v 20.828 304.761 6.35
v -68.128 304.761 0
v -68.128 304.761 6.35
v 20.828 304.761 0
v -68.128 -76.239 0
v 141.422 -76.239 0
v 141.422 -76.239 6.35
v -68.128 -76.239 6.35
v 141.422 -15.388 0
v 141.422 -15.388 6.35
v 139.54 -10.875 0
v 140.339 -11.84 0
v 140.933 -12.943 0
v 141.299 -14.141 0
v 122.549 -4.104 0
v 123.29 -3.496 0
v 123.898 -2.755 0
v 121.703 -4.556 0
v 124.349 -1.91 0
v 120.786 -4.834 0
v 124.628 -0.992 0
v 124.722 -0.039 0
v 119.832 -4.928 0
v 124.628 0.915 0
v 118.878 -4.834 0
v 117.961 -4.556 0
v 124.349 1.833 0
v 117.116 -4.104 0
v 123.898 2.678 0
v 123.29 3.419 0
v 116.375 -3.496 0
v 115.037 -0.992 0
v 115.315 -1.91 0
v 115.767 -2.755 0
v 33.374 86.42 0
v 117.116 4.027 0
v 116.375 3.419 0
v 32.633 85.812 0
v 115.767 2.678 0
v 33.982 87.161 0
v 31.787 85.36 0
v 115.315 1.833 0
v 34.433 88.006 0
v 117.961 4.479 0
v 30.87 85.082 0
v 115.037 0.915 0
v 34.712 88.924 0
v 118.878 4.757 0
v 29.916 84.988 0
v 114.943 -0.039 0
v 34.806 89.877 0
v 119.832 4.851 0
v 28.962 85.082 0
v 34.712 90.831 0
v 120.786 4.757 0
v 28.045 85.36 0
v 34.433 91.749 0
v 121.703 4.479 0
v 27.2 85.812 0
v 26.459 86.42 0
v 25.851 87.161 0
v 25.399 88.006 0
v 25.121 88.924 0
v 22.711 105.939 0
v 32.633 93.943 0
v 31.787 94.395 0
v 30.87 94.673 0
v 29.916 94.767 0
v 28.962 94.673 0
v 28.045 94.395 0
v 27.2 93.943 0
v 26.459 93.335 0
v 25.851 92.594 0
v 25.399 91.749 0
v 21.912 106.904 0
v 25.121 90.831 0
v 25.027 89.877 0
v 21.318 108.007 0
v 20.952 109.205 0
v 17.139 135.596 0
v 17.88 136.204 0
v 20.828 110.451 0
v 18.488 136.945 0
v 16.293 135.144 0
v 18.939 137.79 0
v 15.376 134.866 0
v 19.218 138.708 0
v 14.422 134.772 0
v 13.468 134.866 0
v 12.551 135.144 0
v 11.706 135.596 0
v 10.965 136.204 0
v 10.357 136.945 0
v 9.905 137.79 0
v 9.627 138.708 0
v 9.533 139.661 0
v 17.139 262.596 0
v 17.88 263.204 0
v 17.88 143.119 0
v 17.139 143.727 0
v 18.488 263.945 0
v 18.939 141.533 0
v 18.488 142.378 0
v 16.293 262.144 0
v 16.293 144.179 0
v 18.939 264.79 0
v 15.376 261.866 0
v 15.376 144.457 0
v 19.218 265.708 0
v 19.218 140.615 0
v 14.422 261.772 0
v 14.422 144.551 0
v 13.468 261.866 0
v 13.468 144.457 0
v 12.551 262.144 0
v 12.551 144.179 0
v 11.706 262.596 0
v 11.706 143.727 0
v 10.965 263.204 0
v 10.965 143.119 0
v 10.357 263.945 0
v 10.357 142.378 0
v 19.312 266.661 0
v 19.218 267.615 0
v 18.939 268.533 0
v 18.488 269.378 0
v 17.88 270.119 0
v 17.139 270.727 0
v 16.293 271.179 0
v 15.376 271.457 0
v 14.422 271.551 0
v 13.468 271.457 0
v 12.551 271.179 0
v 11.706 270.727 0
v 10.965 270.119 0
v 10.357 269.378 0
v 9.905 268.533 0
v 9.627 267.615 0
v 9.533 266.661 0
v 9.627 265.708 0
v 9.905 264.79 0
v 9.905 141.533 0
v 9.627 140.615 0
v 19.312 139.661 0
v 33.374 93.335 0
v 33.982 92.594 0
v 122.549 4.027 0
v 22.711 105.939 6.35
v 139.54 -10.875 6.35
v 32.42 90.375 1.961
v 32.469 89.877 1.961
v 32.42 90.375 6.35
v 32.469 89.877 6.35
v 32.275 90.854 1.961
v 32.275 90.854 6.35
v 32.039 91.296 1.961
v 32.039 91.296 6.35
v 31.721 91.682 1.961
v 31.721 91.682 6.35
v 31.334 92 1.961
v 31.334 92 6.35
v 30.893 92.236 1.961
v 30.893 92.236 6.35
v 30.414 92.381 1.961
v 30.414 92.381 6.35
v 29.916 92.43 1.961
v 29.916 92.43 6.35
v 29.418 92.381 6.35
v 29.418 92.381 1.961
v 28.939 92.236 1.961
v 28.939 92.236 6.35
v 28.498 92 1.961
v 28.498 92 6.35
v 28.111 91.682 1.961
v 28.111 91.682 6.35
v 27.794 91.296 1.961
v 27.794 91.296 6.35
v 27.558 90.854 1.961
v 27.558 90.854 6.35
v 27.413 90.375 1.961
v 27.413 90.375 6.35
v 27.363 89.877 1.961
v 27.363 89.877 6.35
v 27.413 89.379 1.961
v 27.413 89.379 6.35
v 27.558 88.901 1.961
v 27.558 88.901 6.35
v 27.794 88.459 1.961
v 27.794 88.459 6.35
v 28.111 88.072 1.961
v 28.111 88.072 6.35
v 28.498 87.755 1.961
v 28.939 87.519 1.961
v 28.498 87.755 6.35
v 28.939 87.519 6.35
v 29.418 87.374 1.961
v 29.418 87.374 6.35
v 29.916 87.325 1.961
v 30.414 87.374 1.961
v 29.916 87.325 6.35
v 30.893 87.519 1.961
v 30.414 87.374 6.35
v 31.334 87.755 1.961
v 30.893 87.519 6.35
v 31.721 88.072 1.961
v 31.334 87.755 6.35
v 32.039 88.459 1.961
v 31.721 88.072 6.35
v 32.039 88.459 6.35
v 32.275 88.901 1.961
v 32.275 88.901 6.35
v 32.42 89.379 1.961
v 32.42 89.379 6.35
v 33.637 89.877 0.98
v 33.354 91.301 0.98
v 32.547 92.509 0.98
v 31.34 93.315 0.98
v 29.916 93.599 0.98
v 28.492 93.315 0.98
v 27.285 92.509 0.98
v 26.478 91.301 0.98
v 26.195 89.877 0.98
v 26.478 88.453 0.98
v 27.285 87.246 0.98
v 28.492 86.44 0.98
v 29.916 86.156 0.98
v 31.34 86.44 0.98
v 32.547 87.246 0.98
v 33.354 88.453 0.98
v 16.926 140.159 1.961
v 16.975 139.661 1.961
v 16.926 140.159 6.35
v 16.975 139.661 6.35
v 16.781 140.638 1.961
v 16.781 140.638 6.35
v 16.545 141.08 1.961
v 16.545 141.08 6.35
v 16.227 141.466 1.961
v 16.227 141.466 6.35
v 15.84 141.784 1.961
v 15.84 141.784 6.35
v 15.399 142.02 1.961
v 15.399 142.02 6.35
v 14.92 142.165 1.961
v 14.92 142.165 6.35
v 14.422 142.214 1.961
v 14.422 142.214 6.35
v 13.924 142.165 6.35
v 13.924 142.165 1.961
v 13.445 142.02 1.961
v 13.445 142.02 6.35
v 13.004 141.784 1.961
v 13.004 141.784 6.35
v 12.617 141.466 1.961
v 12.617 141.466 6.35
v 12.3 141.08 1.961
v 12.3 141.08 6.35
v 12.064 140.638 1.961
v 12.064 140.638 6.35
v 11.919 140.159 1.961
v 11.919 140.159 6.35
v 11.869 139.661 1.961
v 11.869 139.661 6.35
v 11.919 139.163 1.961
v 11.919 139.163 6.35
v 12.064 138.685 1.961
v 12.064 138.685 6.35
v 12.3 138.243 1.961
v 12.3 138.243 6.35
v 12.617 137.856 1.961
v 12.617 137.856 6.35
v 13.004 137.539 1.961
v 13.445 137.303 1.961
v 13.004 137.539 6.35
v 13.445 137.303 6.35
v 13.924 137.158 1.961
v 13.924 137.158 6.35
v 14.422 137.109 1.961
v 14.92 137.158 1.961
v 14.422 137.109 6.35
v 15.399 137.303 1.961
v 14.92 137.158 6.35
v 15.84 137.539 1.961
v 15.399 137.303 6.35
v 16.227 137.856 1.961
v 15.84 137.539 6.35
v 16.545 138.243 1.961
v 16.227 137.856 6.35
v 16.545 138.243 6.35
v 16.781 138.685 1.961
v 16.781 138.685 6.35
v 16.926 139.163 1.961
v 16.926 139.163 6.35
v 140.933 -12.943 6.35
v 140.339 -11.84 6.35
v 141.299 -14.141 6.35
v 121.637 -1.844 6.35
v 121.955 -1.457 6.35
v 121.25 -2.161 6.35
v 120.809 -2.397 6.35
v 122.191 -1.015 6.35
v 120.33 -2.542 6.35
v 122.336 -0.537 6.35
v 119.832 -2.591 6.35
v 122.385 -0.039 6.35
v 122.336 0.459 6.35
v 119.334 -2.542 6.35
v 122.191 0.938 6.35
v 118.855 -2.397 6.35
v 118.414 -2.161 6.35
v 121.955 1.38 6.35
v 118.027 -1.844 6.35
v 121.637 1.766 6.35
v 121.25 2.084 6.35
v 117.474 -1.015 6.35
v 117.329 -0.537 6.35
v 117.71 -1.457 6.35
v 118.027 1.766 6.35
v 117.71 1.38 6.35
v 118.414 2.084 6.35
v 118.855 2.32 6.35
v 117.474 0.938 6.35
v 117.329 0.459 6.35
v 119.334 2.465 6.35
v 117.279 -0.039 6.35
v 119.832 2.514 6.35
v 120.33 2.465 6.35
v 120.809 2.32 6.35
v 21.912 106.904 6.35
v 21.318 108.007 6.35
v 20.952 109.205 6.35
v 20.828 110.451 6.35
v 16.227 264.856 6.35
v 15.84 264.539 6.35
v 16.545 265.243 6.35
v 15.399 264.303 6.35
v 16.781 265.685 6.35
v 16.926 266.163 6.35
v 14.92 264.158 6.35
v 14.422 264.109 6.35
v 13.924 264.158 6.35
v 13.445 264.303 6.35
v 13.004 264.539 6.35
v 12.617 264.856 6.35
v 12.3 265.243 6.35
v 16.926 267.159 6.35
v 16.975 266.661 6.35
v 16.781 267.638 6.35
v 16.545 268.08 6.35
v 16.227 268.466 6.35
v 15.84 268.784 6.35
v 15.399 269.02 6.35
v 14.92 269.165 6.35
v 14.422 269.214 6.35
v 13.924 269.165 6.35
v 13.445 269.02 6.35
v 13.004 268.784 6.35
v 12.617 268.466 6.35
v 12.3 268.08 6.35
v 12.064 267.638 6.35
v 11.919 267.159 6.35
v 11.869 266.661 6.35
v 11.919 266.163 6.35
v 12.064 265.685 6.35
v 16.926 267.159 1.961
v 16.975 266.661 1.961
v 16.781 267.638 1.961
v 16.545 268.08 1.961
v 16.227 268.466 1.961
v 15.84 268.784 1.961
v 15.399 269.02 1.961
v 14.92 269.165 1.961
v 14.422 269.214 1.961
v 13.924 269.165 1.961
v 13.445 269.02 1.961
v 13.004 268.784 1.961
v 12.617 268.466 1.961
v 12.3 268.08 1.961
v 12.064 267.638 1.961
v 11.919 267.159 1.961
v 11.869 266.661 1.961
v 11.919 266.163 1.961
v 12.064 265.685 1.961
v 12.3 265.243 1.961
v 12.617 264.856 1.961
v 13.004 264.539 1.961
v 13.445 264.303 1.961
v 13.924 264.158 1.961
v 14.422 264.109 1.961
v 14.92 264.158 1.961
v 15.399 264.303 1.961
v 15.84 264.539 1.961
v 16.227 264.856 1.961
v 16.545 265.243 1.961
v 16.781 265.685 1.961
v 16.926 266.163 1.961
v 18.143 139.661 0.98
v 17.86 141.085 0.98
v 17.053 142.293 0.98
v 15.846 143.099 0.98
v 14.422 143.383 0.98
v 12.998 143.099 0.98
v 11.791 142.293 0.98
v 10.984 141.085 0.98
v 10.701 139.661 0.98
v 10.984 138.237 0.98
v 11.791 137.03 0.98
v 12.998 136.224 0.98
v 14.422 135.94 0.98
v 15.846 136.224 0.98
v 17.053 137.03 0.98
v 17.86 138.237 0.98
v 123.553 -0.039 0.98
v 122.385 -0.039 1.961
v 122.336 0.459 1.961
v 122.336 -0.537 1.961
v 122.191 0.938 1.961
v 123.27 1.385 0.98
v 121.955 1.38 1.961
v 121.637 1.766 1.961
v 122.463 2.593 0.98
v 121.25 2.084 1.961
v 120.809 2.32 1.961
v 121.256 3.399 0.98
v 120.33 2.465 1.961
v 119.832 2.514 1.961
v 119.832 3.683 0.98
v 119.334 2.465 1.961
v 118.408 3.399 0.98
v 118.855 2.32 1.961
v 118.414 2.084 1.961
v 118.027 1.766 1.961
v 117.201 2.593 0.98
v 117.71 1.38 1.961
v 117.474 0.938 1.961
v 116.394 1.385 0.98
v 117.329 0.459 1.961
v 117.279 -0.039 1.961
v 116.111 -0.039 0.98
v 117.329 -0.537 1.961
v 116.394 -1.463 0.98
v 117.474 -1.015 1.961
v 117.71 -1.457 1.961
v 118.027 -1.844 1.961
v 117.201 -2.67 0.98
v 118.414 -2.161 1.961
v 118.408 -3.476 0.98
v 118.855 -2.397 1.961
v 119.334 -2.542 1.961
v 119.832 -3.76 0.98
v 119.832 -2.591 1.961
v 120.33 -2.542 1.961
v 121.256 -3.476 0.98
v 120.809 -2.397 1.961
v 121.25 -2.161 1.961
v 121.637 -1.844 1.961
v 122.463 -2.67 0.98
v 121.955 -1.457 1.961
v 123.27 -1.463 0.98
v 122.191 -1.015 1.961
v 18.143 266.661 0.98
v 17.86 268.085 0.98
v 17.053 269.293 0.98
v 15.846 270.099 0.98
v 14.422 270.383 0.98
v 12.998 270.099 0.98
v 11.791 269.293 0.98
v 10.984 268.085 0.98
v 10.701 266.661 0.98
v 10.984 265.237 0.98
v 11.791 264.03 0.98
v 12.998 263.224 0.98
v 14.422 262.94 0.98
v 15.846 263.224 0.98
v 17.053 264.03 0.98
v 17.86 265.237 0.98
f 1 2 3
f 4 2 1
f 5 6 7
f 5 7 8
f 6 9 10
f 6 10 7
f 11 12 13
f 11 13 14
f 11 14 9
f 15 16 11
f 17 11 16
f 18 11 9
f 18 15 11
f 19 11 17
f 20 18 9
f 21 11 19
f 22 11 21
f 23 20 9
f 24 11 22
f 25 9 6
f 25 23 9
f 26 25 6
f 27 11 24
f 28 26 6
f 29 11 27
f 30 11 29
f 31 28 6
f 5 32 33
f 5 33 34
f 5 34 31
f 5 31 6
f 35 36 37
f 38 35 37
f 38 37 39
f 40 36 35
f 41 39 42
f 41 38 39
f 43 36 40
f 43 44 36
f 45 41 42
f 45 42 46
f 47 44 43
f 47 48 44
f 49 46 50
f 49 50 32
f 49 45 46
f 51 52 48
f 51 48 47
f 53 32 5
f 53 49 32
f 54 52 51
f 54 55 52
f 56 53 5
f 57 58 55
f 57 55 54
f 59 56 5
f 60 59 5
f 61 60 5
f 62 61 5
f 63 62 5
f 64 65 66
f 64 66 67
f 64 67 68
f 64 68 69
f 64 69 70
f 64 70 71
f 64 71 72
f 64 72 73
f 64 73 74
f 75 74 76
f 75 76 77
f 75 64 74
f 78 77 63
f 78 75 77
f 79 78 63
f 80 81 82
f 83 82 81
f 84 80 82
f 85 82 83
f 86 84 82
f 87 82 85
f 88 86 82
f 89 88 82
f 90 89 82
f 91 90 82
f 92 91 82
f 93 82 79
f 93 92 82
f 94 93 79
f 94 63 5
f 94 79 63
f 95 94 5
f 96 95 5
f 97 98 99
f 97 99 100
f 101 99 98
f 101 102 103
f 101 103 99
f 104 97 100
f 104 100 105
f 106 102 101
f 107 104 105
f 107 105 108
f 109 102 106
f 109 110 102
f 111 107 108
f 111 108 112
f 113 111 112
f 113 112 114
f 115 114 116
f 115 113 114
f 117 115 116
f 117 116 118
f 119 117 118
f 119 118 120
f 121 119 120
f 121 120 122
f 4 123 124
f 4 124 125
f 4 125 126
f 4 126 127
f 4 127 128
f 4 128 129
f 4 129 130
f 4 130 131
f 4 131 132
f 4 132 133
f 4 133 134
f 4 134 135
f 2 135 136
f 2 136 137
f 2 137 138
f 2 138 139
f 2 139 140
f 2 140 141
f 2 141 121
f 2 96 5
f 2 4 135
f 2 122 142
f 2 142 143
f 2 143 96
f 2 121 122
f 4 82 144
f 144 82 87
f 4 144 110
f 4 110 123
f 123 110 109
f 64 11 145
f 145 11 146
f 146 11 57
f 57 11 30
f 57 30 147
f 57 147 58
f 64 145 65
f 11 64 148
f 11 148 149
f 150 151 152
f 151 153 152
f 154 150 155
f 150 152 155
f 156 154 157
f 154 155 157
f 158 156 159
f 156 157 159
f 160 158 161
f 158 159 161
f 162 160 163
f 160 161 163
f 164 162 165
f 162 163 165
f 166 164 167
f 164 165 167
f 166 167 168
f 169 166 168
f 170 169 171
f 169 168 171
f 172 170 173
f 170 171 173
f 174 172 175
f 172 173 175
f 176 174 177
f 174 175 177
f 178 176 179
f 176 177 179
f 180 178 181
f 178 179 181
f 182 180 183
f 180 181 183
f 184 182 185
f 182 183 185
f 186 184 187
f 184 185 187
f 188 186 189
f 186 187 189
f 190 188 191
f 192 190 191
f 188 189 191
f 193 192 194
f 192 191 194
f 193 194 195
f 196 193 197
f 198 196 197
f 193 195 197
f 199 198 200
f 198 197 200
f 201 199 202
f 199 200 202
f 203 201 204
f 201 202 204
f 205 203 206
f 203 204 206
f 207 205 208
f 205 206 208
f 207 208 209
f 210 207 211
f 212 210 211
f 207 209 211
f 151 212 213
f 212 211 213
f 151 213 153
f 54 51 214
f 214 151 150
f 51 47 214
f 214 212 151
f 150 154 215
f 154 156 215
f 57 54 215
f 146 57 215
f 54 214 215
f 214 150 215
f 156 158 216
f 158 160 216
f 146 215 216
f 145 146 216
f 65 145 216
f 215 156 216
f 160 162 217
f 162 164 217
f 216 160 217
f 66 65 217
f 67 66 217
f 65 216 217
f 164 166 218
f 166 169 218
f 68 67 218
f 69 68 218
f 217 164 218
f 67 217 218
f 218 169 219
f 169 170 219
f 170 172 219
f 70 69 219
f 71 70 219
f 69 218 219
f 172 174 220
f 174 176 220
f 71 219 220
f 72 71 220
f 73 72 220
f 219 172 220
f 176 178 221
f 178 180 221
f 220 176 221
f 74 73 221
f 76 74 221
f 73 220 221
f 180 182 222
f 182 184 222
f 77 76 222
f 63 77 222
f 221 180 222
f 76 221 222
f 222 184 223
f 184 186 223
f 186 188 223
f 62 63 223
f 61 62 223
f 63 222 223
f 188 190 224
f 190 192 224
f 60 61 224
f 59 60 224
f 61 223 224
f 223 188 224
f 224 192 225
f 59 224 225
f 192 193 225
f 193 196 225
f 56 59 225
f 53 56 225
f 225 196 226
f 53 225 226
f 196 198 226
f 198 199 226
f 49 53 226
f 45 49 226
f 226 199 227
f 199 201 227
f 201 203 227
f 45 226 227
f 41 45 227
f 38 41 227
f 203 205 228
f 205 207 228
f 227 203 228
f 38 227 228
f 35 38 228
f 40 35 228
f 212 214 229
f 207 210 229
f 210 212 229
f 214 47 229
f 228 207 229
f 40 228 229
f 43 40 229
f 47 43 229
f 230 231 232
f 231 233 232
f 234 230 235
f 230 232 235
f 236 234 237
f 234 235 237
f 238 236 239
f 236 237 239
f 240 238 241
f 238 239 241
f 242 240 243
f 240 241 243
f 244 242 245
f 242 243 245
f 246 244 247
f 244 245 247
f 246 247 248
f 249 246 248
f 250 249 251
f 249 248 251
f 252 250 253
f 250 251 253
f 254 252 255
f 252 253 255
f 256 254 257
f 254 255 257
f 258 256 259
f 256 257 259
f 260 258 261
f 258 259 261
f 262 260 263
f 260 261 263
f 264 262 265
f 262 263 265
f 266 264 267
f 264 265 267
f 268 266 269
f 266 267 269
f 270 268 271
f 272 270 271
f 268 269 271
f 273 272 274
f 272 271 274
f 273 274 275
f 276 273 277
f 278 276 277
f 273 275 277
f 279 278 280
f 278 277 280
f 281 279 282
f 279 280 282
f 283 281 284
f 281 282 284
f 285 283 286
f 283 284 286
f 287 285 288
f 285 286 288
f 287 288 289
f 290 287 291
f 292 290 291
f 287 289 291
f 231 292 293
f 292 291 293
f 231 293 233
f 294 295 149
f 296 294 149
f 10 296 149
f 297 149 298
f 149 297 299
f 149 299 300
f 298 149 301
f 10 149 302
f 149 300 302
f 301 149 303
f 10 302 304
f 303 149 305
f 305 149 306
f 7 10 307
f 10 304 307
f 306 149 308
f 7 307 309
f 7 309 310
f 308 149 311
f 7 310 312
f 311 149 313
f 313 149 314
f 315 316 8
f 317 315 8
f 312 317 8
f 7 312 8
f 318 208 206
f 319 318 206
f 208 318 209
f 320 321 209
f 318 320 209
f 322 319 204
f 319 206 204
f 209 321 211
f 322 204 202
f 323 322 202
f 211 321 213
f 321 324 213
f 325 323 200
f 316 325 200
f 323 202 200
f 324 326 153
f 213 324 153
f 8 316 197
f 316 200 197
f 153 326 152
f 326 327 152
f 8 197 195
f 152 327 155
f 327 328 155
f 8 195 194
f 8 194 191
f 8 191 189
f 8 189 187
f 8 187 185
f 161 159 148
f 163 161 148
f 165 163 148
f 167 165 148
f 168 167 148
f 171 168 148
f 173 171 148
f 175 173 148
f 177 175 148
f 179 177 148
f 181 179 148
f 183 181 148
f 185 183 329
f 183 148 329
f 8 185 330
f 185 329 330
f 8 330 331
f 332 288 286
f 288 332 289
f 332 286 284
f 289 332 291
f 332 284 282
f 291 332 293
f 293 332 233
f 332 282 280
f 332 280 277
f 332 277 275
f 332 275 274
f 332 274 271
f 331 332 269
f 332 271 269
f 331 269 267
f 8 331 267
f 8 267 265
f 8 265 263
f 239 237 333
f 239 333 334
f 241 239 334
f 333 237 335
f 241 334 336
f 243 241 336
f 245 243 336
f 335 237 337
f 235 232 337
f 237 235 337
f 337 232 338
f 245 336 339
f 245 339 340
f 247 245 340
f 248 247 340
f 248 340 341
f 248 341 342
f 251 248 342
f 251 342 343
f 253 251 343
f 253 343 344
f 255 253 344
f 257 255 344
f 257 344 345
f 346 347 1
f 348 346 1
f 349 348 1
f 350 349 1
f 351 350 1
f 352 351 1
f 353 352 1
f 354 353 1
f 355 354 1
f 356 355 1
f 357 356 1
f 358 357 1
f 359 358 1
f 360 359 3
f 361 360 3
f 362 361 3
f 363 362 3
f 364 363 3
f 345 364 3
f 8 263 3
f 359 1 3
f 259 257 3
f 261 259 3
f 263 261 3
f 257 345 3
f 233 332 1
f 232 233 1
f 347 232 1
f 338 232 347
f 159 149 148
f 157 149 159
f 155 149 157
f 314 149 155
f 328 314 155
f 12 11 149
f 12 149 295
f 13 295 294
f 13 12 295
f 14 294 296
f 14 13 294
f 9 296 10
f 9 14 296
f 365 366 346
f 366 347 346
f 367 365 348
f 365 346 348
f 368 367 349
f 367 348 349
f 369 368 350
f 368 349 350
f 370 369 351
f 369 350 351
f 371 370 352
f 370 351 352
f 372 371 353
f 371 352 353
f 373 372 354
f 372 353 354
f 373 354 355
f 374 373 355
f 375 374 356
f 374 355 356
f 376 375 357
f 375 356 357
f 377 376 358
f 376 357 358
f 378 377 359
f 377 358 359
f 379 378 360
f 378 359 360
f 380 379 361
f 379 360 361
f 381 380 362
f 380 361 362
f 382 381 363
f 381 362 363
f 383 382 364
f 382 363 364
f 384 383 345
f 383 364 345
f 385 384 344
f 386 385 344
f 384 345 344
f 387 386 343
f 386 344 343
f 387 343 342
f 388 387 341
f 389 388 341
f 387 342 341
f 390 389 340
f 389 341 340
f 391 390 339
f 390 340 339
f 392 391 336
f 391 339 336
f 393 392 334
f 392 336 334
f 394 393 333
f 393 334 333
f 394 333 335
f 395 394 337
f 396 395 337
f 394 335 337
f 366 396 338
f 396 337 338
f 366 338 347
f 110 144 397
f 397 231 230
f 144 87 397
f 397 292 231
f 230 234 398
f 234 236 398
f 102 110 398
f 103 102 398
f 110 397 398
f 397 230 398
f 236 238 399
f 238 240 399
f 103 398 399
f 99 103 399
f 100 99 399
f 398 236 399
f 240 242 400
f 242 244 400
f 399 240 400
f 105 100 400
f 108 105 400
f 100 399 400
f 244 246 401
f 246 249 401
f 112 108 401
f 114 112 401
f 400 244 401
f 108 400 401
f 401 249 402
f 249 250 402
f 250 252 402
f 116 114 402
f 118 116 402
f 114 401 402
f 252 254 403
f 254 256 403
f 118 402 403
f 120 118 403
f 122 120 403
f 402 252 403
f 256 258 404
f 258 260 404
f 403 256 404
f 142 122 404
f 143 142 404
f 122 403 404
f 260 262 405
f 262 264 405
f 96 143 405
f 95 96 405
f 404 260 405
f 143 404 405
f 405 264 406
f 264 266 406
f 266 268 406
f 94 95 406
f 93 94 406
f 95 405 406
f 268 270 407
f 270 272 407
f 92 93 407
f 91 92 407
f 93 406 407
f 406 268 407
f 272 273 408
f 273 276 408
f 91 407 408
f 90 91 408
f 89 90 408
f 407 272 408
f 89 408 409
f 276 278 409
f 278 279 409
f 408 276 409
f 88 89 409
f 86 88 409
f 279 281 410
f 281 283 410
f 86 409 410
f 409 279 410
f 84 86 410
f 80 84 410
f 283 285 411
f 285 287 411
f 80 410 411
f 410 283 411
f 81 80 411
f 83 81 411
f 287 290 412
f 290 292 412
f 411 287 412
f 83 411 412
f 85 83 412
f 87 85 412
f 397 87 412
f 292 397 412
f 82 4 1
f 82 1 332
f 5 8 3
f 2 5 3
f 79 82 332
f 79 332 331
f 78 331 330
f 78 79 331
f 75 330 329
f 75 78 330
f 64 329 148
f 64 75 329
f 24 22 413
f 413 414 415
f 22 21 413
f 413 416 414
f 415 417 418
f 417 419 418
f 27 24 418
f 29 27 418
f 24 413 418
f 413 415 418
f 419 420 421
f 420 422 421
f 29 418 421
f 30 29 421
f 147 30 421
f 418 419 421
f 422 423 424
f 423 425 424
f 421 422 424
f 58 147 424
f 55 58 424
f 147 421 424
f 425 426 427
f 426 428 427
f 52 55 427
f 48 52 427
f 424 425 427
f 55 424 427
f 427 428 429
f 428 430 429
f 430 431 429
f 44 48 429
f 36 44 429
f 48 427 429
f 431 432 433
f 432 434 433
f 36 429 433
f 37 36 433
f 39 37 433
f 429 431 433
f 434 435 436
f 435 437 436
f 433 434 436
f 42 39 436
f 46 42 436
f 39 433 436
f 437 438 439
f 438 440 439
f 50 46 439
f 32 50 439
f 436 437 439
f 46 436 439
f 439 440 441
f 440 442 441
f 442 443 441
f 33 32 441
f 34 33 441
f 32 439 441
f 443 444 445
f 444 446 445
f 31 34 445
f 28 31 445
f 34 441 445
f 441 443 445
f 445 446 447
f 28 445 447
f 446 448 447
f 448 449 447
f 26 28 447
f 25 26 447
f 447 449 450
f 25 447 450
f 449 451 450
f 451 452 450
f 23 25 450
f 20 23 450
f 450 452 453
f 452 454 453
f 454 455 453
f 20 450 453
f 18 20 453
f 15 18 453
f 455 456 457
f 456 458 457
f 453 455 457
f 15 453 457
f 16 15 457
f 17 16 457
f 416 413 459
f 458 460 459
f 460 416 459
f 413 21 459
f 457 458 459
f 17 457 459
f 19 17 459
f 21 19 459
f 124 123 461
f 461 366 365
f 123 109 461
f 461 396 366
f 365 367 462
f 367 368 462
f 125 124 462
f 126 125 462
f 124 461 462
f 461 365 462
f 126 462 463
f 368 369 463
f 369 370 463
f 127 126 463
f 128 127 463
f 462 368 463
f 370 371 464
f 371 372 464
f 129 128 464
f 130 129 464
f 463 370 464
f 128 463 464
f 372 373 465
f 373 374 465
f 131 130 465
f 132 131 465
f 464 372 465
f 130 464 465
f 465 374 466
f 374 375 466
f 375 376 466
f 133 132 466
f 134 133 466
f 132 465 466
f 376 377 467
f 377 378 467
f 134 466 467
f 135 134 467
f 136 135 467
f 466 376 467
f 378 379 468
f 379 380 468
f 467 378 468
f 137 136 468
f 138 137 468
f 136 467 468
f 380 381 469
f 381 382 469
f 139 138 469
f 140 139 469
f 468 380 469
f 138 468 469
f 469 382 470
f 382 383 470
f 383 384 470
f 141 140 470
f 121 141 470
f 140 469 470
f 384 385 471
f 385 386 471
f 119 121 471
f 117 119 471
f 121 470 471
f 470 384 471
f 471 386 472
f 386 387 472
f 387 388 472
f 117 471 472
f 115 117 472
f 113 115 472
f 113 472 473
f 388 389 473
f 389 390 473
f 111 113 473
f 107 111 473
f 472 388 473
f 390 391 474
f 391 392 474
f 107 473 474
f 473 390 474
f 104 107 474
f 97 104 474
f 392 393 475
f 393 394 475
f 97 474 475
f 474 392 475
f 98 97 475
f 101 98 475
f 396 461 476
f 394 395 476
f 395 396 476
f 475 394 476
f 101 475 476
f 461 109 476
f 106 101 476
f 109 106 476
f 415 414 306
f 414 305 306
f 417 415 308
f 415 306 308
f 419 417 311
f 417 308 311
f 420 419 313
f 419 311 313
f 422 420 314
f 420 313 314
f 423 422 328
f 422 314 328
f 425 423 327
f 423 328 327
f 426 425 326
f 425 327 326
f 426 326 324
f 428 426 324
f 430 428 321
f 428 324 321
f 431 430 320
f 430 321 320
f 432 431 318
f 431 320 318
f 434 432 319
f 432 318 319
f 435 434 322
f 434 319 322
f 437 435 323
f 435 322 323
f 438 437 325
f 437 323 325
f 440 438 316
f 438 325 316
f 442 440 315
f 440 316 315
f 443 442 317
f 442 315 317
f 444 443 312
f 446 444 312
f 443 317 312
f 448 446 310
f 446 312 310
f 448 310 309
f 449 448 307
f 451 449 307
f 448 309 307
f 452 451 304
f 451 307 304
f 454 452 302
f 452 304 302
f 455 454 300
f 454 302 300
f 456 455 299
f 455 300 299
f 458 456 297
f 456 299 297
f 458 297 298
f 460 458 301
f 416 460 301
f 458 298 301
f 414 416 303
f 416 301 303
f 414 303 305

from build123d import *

# Parameters (mm, degrees)
BOSS_EXTRUDE1_DEPTH                                = 6.35
SKETCH2_W                                          = 33.274
SKETCH2_H                                          = 381
CUT_EXTRUDE1_DEPTH                                 = 7.35
CSK_FOR_10_FLAT_HEAD_MACHINE_SCREW_100_D           = 5.1054
CSK_FOR_10_FLAT_HEAD_MACHINE_SCREW_100_CSINK_D     = 9.779
CSK_FOR_10_FLAT_HEAD_MACHINE_SCREW_100_CSINK_ANGLE = 100


with BuildPart() as part:
    # Sketch1 → Boss-Extrude1 (new body)
    with BuildSketch(Plane.XY):
        with BuildLine():
            Line((141.422179454, -15.387658672), (141.422179454, -76.238562419))
            Line((141.422179454, -76.238562419), (133.548179454, -76.238562419))
            Line((133.548179454, -76.238562419), (-101.401820546, -76.238562419))
            Line((-101.401820546, -76.238562419), (-101.401820546, 304.761437581))
            Line((-101.401820546, 304.761437581), (0, 304.761437581))
            Line((0, 304.761437581), (20.828, 304.761437581))
            Line((20.828, 304.761437581), (20.828, 110.451437581))
            ThreePointArc((20.828, 110.451437581), (21.317531228, 108.006564216), (22.710647487, 105.938648918))
            Line((22.710647487, 105.938648918), (139.539531967, -10.874870008))
            ThreePointArc((139.539531967, -10.874870008), (140.932648226, -12.942785307), (141.422179454, -15.387658672))
        make_face()
    extrude(amount=BOSS_EXTRUDE1_DEPTH)

    # Sketch2 → Cut-Extrude1 (cut, through all)
    with BuildSketch(Plane.XY.offset(6.35)):
        with Locations((-84.764820546, 114.261437581)):
            Rectangle(SKETCH2_W, SKETCH2_H)
    extrude(amount=-CUT_EXTRUDE1_DEPTH, mode=Mode.SUBTRACT)

    # CSK for #10 Flat Head Machine Screw (100)1 (through all)
    with Locations(Plane(origin=(119.832179454, -0.038562419, 0), x_dir=(-1, 0, 0), z_dir=(0, 0, -1))):
        with Locations((0, 0), (89.916, 89.916), (105.41, 139.7), (105.41, 266.7)):
            CounterSinkHole(CSK_FOR_10_FLAT_HEAD_MACHINE_SCREW_100_D / 2, CSK_FOR_10_FLAT_HEAD_MACHINE_SCREW_100_CSINK_D / 2, counter_sink_angle=CSK_FOR_10_FLAT_HEAD_MACHINE_SCREW_100_CSINK_ANGLE)


solid = part.part
